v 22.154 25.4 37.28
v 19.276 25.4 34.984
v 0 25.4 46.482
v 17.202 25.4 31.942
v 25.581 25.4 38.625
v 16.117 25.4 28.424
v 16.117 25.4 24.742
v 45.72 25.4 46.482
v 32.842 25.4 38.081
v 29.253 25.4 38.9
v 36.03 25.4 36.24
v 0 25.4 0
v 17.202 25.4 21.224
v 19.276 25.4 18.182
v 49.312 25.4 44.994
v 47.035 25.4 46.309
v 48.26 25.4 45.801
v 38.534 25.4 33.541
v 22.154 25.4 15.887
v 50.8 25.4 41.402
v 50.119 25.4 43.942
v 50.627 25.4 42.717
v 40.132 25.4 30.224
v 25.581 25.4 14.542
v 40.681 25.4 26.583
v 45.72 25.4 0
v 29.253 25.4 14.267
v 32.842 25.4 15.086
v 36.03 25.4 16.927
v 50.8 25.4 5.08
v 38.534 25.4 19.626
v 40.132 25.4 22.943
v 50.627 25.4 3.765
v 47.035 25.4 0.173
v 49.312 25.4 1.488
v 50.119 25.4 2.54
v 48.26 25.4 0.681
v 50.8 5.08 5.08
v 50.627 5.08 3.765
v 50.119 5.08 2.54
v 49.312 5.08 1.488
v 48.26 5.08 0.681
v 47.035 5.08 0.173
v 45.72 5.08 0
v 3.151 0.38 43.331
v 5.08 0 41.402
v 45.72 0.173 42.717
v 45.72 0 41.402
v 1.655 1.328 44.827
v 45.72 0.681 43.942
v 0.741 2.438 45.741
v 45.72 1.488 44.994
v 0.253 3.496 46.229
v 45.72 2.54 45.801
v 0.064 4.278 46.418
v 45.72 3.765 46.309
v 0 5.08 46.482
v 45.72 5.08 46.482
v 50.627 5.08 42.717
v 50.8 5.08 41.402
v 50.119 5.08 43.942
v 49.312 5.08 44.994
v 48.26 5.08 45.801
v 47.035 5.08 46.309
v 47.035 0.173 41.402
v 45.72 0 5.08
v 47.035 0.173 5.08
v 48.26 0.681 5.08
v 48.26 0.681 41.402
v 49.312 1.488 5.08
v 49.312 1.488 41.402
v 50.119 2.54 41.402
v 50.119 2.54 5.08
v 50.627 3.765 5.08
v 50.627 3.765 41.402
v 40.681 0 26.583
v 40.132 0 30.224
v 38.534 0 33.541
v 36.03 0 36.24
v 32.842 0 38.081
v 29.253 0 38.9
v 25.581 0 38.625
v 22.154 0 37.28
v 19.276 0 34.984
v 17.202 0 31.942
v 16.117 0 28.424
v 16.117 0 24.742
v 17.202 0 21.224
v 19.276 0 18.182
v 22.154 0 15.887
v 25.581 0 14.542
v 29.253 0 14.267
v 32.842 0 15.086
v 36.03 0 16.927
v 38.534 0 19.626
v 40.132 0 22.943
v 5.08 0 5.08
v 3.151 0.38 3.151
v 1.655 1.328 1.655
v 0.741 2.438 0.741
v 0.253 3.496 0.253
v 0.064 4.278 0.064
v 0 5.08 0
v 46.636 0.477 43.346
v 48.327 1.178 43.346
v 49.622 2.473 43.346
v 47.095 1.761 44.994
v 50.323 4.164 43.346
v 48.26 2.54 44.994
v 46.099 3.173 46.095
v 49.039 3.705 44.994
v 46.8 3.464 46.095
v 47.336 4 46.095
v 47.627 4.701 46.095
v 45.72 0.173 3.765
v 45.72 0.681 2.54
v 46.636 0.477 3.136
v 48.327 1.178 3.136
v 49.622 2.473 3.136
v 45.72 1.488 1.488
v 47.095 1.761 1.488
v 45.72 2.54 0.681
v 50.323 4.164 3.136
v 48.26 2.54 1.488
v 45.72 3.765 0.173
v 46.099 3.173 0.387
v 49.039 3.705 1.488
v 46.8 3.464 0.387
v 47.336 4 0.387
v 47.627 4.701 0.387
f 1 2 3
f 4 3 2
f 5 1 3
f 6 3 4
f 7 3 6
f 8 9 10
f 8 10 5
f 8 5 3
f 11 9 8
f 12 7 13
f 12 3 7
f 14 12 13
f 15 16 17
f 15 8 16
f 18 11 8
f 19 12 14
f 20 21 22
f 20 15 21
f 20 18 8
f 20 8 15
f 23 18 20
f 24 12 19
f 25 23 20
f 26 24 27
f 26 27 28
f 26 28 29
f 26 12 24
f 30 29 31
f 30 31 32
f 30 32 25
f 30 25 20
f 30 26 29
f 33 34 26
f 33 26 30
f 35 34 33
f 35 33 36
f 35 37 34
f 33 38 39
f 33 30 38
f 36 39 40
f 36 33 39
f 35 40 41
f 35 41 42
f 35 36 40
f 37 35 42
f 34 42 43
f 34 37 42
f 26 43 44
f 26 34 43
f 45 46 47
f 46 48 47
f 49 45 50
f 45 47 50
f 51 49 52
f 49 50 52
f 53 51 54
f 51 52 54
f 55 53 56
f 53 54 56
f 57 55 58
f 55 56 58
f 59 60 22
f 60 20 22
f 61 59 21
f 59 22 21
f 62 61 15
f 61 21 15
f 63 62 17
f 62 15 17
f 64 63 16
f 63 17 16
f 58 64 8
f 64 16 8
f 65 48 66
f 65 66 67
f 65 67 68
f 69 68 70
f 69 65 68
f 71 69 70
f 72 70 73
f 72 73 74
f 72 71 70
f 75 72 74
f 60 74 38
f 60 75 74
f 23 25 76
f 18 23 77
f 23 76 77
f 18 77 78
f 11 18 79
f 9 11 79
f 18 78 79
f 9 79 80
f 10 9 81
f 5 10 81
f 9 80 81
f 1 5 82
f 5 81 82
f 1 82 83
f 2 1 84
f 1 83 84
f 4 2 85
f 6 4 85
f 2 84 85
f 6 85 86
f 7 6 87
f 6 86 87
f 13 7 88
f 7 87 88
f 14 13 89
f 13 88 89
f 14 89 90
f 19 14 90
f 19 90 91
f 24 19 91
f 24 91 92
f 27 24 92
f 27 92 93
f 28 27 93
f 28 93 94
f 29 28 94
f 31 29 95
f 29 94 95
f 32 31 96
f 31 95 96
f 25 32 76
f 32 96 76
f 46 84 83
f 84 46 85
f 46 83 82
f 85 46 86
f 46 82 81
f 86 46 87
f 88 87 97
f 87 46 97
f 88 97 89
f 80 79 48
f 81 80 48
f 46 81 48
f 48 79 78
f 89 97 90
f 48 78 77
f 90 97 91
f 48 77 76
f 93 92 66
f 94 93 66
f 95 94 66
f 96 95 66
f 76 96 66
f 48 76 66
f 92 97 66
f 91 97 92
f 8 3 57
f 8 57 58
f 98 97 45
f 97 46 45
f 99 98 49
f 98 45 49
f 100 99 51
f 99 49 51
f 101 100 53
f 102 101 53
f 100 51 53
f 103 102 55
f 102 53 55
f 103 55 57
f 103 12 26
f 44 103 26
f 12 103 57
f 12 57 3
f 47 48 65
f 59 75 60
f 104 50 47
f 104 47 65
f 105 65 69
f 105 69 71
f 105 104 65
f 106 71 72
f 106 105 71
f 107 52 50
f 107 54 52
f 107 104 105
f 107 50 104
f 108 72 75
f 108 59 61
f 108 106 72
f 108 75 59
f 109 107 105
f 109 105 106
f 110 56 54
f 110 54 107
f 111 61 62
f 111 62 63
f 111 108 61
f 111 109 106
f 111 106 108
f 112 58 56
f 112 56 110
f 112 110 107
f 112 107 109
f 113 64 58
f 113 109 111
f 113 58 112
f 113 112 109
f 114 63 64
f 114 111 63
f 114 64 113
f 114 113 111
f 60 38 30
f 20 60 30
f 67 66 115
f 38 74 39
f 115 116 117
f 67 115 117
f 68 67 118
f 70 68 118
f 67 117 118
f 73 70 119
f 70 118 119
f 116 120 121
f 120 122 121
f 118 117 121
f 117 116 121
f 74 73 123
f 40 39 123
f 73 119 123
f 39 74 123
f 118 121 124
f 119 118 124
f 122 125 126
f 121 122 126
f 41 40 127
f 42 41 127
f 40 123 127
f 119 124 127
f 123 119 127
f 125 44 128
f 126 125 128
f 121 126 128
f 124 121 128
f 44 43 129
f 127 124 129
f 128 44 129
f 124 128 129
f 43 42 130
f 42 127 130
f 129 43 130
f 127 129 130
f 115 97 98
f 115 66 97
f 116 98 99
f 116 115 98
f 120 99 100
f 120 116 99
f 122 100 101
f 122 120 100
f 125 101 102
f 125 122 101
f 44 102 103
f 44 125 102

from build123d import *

# Parameters (mm, degrees)
F0_W     = 50.8
F0_H     = 25.4
F1_DEPTH = 46.482
F2_R     = 12.351013
F3_DEPTH = 25.4
F4_R     = 5.08
F5_R     = 5.08


with BuildPart() as f1:
    # F0 (on Top) → F1 (new body)
    with BuildSketch(Plane.XY):
        with Locations((25.4, 12.7)):
            Rectangle(F0_W, F0_H)
    extrude(amount=F1_DEPTH)

    # F2 (on face) → F3 (cut)
    with BuildSketch(Plane.XZ):
        with Locations((28.329594, 26.583312)):
            Circle(F2_R)
    extrude(amount=-F3_DEPTH, mode=Mode.SUBTRACT)

    # F4
    f4_edges = [f1.edges().sort_by_distance(p)[0] for p in [
        (50.8, 0, 23.241),
    ]]
    fillet(f4_edges, radius=F4_R)

    # F5
    f5_edges = [f1.edges().sort_by_distance(p)[0] for p in [
        (22.86, 0, 0),
        (0, 0, 23.241),
        (22.86, 0, 46.482),
    ]]
    fillet(f5_edges, radius=F5_R)


solid = f1.part
